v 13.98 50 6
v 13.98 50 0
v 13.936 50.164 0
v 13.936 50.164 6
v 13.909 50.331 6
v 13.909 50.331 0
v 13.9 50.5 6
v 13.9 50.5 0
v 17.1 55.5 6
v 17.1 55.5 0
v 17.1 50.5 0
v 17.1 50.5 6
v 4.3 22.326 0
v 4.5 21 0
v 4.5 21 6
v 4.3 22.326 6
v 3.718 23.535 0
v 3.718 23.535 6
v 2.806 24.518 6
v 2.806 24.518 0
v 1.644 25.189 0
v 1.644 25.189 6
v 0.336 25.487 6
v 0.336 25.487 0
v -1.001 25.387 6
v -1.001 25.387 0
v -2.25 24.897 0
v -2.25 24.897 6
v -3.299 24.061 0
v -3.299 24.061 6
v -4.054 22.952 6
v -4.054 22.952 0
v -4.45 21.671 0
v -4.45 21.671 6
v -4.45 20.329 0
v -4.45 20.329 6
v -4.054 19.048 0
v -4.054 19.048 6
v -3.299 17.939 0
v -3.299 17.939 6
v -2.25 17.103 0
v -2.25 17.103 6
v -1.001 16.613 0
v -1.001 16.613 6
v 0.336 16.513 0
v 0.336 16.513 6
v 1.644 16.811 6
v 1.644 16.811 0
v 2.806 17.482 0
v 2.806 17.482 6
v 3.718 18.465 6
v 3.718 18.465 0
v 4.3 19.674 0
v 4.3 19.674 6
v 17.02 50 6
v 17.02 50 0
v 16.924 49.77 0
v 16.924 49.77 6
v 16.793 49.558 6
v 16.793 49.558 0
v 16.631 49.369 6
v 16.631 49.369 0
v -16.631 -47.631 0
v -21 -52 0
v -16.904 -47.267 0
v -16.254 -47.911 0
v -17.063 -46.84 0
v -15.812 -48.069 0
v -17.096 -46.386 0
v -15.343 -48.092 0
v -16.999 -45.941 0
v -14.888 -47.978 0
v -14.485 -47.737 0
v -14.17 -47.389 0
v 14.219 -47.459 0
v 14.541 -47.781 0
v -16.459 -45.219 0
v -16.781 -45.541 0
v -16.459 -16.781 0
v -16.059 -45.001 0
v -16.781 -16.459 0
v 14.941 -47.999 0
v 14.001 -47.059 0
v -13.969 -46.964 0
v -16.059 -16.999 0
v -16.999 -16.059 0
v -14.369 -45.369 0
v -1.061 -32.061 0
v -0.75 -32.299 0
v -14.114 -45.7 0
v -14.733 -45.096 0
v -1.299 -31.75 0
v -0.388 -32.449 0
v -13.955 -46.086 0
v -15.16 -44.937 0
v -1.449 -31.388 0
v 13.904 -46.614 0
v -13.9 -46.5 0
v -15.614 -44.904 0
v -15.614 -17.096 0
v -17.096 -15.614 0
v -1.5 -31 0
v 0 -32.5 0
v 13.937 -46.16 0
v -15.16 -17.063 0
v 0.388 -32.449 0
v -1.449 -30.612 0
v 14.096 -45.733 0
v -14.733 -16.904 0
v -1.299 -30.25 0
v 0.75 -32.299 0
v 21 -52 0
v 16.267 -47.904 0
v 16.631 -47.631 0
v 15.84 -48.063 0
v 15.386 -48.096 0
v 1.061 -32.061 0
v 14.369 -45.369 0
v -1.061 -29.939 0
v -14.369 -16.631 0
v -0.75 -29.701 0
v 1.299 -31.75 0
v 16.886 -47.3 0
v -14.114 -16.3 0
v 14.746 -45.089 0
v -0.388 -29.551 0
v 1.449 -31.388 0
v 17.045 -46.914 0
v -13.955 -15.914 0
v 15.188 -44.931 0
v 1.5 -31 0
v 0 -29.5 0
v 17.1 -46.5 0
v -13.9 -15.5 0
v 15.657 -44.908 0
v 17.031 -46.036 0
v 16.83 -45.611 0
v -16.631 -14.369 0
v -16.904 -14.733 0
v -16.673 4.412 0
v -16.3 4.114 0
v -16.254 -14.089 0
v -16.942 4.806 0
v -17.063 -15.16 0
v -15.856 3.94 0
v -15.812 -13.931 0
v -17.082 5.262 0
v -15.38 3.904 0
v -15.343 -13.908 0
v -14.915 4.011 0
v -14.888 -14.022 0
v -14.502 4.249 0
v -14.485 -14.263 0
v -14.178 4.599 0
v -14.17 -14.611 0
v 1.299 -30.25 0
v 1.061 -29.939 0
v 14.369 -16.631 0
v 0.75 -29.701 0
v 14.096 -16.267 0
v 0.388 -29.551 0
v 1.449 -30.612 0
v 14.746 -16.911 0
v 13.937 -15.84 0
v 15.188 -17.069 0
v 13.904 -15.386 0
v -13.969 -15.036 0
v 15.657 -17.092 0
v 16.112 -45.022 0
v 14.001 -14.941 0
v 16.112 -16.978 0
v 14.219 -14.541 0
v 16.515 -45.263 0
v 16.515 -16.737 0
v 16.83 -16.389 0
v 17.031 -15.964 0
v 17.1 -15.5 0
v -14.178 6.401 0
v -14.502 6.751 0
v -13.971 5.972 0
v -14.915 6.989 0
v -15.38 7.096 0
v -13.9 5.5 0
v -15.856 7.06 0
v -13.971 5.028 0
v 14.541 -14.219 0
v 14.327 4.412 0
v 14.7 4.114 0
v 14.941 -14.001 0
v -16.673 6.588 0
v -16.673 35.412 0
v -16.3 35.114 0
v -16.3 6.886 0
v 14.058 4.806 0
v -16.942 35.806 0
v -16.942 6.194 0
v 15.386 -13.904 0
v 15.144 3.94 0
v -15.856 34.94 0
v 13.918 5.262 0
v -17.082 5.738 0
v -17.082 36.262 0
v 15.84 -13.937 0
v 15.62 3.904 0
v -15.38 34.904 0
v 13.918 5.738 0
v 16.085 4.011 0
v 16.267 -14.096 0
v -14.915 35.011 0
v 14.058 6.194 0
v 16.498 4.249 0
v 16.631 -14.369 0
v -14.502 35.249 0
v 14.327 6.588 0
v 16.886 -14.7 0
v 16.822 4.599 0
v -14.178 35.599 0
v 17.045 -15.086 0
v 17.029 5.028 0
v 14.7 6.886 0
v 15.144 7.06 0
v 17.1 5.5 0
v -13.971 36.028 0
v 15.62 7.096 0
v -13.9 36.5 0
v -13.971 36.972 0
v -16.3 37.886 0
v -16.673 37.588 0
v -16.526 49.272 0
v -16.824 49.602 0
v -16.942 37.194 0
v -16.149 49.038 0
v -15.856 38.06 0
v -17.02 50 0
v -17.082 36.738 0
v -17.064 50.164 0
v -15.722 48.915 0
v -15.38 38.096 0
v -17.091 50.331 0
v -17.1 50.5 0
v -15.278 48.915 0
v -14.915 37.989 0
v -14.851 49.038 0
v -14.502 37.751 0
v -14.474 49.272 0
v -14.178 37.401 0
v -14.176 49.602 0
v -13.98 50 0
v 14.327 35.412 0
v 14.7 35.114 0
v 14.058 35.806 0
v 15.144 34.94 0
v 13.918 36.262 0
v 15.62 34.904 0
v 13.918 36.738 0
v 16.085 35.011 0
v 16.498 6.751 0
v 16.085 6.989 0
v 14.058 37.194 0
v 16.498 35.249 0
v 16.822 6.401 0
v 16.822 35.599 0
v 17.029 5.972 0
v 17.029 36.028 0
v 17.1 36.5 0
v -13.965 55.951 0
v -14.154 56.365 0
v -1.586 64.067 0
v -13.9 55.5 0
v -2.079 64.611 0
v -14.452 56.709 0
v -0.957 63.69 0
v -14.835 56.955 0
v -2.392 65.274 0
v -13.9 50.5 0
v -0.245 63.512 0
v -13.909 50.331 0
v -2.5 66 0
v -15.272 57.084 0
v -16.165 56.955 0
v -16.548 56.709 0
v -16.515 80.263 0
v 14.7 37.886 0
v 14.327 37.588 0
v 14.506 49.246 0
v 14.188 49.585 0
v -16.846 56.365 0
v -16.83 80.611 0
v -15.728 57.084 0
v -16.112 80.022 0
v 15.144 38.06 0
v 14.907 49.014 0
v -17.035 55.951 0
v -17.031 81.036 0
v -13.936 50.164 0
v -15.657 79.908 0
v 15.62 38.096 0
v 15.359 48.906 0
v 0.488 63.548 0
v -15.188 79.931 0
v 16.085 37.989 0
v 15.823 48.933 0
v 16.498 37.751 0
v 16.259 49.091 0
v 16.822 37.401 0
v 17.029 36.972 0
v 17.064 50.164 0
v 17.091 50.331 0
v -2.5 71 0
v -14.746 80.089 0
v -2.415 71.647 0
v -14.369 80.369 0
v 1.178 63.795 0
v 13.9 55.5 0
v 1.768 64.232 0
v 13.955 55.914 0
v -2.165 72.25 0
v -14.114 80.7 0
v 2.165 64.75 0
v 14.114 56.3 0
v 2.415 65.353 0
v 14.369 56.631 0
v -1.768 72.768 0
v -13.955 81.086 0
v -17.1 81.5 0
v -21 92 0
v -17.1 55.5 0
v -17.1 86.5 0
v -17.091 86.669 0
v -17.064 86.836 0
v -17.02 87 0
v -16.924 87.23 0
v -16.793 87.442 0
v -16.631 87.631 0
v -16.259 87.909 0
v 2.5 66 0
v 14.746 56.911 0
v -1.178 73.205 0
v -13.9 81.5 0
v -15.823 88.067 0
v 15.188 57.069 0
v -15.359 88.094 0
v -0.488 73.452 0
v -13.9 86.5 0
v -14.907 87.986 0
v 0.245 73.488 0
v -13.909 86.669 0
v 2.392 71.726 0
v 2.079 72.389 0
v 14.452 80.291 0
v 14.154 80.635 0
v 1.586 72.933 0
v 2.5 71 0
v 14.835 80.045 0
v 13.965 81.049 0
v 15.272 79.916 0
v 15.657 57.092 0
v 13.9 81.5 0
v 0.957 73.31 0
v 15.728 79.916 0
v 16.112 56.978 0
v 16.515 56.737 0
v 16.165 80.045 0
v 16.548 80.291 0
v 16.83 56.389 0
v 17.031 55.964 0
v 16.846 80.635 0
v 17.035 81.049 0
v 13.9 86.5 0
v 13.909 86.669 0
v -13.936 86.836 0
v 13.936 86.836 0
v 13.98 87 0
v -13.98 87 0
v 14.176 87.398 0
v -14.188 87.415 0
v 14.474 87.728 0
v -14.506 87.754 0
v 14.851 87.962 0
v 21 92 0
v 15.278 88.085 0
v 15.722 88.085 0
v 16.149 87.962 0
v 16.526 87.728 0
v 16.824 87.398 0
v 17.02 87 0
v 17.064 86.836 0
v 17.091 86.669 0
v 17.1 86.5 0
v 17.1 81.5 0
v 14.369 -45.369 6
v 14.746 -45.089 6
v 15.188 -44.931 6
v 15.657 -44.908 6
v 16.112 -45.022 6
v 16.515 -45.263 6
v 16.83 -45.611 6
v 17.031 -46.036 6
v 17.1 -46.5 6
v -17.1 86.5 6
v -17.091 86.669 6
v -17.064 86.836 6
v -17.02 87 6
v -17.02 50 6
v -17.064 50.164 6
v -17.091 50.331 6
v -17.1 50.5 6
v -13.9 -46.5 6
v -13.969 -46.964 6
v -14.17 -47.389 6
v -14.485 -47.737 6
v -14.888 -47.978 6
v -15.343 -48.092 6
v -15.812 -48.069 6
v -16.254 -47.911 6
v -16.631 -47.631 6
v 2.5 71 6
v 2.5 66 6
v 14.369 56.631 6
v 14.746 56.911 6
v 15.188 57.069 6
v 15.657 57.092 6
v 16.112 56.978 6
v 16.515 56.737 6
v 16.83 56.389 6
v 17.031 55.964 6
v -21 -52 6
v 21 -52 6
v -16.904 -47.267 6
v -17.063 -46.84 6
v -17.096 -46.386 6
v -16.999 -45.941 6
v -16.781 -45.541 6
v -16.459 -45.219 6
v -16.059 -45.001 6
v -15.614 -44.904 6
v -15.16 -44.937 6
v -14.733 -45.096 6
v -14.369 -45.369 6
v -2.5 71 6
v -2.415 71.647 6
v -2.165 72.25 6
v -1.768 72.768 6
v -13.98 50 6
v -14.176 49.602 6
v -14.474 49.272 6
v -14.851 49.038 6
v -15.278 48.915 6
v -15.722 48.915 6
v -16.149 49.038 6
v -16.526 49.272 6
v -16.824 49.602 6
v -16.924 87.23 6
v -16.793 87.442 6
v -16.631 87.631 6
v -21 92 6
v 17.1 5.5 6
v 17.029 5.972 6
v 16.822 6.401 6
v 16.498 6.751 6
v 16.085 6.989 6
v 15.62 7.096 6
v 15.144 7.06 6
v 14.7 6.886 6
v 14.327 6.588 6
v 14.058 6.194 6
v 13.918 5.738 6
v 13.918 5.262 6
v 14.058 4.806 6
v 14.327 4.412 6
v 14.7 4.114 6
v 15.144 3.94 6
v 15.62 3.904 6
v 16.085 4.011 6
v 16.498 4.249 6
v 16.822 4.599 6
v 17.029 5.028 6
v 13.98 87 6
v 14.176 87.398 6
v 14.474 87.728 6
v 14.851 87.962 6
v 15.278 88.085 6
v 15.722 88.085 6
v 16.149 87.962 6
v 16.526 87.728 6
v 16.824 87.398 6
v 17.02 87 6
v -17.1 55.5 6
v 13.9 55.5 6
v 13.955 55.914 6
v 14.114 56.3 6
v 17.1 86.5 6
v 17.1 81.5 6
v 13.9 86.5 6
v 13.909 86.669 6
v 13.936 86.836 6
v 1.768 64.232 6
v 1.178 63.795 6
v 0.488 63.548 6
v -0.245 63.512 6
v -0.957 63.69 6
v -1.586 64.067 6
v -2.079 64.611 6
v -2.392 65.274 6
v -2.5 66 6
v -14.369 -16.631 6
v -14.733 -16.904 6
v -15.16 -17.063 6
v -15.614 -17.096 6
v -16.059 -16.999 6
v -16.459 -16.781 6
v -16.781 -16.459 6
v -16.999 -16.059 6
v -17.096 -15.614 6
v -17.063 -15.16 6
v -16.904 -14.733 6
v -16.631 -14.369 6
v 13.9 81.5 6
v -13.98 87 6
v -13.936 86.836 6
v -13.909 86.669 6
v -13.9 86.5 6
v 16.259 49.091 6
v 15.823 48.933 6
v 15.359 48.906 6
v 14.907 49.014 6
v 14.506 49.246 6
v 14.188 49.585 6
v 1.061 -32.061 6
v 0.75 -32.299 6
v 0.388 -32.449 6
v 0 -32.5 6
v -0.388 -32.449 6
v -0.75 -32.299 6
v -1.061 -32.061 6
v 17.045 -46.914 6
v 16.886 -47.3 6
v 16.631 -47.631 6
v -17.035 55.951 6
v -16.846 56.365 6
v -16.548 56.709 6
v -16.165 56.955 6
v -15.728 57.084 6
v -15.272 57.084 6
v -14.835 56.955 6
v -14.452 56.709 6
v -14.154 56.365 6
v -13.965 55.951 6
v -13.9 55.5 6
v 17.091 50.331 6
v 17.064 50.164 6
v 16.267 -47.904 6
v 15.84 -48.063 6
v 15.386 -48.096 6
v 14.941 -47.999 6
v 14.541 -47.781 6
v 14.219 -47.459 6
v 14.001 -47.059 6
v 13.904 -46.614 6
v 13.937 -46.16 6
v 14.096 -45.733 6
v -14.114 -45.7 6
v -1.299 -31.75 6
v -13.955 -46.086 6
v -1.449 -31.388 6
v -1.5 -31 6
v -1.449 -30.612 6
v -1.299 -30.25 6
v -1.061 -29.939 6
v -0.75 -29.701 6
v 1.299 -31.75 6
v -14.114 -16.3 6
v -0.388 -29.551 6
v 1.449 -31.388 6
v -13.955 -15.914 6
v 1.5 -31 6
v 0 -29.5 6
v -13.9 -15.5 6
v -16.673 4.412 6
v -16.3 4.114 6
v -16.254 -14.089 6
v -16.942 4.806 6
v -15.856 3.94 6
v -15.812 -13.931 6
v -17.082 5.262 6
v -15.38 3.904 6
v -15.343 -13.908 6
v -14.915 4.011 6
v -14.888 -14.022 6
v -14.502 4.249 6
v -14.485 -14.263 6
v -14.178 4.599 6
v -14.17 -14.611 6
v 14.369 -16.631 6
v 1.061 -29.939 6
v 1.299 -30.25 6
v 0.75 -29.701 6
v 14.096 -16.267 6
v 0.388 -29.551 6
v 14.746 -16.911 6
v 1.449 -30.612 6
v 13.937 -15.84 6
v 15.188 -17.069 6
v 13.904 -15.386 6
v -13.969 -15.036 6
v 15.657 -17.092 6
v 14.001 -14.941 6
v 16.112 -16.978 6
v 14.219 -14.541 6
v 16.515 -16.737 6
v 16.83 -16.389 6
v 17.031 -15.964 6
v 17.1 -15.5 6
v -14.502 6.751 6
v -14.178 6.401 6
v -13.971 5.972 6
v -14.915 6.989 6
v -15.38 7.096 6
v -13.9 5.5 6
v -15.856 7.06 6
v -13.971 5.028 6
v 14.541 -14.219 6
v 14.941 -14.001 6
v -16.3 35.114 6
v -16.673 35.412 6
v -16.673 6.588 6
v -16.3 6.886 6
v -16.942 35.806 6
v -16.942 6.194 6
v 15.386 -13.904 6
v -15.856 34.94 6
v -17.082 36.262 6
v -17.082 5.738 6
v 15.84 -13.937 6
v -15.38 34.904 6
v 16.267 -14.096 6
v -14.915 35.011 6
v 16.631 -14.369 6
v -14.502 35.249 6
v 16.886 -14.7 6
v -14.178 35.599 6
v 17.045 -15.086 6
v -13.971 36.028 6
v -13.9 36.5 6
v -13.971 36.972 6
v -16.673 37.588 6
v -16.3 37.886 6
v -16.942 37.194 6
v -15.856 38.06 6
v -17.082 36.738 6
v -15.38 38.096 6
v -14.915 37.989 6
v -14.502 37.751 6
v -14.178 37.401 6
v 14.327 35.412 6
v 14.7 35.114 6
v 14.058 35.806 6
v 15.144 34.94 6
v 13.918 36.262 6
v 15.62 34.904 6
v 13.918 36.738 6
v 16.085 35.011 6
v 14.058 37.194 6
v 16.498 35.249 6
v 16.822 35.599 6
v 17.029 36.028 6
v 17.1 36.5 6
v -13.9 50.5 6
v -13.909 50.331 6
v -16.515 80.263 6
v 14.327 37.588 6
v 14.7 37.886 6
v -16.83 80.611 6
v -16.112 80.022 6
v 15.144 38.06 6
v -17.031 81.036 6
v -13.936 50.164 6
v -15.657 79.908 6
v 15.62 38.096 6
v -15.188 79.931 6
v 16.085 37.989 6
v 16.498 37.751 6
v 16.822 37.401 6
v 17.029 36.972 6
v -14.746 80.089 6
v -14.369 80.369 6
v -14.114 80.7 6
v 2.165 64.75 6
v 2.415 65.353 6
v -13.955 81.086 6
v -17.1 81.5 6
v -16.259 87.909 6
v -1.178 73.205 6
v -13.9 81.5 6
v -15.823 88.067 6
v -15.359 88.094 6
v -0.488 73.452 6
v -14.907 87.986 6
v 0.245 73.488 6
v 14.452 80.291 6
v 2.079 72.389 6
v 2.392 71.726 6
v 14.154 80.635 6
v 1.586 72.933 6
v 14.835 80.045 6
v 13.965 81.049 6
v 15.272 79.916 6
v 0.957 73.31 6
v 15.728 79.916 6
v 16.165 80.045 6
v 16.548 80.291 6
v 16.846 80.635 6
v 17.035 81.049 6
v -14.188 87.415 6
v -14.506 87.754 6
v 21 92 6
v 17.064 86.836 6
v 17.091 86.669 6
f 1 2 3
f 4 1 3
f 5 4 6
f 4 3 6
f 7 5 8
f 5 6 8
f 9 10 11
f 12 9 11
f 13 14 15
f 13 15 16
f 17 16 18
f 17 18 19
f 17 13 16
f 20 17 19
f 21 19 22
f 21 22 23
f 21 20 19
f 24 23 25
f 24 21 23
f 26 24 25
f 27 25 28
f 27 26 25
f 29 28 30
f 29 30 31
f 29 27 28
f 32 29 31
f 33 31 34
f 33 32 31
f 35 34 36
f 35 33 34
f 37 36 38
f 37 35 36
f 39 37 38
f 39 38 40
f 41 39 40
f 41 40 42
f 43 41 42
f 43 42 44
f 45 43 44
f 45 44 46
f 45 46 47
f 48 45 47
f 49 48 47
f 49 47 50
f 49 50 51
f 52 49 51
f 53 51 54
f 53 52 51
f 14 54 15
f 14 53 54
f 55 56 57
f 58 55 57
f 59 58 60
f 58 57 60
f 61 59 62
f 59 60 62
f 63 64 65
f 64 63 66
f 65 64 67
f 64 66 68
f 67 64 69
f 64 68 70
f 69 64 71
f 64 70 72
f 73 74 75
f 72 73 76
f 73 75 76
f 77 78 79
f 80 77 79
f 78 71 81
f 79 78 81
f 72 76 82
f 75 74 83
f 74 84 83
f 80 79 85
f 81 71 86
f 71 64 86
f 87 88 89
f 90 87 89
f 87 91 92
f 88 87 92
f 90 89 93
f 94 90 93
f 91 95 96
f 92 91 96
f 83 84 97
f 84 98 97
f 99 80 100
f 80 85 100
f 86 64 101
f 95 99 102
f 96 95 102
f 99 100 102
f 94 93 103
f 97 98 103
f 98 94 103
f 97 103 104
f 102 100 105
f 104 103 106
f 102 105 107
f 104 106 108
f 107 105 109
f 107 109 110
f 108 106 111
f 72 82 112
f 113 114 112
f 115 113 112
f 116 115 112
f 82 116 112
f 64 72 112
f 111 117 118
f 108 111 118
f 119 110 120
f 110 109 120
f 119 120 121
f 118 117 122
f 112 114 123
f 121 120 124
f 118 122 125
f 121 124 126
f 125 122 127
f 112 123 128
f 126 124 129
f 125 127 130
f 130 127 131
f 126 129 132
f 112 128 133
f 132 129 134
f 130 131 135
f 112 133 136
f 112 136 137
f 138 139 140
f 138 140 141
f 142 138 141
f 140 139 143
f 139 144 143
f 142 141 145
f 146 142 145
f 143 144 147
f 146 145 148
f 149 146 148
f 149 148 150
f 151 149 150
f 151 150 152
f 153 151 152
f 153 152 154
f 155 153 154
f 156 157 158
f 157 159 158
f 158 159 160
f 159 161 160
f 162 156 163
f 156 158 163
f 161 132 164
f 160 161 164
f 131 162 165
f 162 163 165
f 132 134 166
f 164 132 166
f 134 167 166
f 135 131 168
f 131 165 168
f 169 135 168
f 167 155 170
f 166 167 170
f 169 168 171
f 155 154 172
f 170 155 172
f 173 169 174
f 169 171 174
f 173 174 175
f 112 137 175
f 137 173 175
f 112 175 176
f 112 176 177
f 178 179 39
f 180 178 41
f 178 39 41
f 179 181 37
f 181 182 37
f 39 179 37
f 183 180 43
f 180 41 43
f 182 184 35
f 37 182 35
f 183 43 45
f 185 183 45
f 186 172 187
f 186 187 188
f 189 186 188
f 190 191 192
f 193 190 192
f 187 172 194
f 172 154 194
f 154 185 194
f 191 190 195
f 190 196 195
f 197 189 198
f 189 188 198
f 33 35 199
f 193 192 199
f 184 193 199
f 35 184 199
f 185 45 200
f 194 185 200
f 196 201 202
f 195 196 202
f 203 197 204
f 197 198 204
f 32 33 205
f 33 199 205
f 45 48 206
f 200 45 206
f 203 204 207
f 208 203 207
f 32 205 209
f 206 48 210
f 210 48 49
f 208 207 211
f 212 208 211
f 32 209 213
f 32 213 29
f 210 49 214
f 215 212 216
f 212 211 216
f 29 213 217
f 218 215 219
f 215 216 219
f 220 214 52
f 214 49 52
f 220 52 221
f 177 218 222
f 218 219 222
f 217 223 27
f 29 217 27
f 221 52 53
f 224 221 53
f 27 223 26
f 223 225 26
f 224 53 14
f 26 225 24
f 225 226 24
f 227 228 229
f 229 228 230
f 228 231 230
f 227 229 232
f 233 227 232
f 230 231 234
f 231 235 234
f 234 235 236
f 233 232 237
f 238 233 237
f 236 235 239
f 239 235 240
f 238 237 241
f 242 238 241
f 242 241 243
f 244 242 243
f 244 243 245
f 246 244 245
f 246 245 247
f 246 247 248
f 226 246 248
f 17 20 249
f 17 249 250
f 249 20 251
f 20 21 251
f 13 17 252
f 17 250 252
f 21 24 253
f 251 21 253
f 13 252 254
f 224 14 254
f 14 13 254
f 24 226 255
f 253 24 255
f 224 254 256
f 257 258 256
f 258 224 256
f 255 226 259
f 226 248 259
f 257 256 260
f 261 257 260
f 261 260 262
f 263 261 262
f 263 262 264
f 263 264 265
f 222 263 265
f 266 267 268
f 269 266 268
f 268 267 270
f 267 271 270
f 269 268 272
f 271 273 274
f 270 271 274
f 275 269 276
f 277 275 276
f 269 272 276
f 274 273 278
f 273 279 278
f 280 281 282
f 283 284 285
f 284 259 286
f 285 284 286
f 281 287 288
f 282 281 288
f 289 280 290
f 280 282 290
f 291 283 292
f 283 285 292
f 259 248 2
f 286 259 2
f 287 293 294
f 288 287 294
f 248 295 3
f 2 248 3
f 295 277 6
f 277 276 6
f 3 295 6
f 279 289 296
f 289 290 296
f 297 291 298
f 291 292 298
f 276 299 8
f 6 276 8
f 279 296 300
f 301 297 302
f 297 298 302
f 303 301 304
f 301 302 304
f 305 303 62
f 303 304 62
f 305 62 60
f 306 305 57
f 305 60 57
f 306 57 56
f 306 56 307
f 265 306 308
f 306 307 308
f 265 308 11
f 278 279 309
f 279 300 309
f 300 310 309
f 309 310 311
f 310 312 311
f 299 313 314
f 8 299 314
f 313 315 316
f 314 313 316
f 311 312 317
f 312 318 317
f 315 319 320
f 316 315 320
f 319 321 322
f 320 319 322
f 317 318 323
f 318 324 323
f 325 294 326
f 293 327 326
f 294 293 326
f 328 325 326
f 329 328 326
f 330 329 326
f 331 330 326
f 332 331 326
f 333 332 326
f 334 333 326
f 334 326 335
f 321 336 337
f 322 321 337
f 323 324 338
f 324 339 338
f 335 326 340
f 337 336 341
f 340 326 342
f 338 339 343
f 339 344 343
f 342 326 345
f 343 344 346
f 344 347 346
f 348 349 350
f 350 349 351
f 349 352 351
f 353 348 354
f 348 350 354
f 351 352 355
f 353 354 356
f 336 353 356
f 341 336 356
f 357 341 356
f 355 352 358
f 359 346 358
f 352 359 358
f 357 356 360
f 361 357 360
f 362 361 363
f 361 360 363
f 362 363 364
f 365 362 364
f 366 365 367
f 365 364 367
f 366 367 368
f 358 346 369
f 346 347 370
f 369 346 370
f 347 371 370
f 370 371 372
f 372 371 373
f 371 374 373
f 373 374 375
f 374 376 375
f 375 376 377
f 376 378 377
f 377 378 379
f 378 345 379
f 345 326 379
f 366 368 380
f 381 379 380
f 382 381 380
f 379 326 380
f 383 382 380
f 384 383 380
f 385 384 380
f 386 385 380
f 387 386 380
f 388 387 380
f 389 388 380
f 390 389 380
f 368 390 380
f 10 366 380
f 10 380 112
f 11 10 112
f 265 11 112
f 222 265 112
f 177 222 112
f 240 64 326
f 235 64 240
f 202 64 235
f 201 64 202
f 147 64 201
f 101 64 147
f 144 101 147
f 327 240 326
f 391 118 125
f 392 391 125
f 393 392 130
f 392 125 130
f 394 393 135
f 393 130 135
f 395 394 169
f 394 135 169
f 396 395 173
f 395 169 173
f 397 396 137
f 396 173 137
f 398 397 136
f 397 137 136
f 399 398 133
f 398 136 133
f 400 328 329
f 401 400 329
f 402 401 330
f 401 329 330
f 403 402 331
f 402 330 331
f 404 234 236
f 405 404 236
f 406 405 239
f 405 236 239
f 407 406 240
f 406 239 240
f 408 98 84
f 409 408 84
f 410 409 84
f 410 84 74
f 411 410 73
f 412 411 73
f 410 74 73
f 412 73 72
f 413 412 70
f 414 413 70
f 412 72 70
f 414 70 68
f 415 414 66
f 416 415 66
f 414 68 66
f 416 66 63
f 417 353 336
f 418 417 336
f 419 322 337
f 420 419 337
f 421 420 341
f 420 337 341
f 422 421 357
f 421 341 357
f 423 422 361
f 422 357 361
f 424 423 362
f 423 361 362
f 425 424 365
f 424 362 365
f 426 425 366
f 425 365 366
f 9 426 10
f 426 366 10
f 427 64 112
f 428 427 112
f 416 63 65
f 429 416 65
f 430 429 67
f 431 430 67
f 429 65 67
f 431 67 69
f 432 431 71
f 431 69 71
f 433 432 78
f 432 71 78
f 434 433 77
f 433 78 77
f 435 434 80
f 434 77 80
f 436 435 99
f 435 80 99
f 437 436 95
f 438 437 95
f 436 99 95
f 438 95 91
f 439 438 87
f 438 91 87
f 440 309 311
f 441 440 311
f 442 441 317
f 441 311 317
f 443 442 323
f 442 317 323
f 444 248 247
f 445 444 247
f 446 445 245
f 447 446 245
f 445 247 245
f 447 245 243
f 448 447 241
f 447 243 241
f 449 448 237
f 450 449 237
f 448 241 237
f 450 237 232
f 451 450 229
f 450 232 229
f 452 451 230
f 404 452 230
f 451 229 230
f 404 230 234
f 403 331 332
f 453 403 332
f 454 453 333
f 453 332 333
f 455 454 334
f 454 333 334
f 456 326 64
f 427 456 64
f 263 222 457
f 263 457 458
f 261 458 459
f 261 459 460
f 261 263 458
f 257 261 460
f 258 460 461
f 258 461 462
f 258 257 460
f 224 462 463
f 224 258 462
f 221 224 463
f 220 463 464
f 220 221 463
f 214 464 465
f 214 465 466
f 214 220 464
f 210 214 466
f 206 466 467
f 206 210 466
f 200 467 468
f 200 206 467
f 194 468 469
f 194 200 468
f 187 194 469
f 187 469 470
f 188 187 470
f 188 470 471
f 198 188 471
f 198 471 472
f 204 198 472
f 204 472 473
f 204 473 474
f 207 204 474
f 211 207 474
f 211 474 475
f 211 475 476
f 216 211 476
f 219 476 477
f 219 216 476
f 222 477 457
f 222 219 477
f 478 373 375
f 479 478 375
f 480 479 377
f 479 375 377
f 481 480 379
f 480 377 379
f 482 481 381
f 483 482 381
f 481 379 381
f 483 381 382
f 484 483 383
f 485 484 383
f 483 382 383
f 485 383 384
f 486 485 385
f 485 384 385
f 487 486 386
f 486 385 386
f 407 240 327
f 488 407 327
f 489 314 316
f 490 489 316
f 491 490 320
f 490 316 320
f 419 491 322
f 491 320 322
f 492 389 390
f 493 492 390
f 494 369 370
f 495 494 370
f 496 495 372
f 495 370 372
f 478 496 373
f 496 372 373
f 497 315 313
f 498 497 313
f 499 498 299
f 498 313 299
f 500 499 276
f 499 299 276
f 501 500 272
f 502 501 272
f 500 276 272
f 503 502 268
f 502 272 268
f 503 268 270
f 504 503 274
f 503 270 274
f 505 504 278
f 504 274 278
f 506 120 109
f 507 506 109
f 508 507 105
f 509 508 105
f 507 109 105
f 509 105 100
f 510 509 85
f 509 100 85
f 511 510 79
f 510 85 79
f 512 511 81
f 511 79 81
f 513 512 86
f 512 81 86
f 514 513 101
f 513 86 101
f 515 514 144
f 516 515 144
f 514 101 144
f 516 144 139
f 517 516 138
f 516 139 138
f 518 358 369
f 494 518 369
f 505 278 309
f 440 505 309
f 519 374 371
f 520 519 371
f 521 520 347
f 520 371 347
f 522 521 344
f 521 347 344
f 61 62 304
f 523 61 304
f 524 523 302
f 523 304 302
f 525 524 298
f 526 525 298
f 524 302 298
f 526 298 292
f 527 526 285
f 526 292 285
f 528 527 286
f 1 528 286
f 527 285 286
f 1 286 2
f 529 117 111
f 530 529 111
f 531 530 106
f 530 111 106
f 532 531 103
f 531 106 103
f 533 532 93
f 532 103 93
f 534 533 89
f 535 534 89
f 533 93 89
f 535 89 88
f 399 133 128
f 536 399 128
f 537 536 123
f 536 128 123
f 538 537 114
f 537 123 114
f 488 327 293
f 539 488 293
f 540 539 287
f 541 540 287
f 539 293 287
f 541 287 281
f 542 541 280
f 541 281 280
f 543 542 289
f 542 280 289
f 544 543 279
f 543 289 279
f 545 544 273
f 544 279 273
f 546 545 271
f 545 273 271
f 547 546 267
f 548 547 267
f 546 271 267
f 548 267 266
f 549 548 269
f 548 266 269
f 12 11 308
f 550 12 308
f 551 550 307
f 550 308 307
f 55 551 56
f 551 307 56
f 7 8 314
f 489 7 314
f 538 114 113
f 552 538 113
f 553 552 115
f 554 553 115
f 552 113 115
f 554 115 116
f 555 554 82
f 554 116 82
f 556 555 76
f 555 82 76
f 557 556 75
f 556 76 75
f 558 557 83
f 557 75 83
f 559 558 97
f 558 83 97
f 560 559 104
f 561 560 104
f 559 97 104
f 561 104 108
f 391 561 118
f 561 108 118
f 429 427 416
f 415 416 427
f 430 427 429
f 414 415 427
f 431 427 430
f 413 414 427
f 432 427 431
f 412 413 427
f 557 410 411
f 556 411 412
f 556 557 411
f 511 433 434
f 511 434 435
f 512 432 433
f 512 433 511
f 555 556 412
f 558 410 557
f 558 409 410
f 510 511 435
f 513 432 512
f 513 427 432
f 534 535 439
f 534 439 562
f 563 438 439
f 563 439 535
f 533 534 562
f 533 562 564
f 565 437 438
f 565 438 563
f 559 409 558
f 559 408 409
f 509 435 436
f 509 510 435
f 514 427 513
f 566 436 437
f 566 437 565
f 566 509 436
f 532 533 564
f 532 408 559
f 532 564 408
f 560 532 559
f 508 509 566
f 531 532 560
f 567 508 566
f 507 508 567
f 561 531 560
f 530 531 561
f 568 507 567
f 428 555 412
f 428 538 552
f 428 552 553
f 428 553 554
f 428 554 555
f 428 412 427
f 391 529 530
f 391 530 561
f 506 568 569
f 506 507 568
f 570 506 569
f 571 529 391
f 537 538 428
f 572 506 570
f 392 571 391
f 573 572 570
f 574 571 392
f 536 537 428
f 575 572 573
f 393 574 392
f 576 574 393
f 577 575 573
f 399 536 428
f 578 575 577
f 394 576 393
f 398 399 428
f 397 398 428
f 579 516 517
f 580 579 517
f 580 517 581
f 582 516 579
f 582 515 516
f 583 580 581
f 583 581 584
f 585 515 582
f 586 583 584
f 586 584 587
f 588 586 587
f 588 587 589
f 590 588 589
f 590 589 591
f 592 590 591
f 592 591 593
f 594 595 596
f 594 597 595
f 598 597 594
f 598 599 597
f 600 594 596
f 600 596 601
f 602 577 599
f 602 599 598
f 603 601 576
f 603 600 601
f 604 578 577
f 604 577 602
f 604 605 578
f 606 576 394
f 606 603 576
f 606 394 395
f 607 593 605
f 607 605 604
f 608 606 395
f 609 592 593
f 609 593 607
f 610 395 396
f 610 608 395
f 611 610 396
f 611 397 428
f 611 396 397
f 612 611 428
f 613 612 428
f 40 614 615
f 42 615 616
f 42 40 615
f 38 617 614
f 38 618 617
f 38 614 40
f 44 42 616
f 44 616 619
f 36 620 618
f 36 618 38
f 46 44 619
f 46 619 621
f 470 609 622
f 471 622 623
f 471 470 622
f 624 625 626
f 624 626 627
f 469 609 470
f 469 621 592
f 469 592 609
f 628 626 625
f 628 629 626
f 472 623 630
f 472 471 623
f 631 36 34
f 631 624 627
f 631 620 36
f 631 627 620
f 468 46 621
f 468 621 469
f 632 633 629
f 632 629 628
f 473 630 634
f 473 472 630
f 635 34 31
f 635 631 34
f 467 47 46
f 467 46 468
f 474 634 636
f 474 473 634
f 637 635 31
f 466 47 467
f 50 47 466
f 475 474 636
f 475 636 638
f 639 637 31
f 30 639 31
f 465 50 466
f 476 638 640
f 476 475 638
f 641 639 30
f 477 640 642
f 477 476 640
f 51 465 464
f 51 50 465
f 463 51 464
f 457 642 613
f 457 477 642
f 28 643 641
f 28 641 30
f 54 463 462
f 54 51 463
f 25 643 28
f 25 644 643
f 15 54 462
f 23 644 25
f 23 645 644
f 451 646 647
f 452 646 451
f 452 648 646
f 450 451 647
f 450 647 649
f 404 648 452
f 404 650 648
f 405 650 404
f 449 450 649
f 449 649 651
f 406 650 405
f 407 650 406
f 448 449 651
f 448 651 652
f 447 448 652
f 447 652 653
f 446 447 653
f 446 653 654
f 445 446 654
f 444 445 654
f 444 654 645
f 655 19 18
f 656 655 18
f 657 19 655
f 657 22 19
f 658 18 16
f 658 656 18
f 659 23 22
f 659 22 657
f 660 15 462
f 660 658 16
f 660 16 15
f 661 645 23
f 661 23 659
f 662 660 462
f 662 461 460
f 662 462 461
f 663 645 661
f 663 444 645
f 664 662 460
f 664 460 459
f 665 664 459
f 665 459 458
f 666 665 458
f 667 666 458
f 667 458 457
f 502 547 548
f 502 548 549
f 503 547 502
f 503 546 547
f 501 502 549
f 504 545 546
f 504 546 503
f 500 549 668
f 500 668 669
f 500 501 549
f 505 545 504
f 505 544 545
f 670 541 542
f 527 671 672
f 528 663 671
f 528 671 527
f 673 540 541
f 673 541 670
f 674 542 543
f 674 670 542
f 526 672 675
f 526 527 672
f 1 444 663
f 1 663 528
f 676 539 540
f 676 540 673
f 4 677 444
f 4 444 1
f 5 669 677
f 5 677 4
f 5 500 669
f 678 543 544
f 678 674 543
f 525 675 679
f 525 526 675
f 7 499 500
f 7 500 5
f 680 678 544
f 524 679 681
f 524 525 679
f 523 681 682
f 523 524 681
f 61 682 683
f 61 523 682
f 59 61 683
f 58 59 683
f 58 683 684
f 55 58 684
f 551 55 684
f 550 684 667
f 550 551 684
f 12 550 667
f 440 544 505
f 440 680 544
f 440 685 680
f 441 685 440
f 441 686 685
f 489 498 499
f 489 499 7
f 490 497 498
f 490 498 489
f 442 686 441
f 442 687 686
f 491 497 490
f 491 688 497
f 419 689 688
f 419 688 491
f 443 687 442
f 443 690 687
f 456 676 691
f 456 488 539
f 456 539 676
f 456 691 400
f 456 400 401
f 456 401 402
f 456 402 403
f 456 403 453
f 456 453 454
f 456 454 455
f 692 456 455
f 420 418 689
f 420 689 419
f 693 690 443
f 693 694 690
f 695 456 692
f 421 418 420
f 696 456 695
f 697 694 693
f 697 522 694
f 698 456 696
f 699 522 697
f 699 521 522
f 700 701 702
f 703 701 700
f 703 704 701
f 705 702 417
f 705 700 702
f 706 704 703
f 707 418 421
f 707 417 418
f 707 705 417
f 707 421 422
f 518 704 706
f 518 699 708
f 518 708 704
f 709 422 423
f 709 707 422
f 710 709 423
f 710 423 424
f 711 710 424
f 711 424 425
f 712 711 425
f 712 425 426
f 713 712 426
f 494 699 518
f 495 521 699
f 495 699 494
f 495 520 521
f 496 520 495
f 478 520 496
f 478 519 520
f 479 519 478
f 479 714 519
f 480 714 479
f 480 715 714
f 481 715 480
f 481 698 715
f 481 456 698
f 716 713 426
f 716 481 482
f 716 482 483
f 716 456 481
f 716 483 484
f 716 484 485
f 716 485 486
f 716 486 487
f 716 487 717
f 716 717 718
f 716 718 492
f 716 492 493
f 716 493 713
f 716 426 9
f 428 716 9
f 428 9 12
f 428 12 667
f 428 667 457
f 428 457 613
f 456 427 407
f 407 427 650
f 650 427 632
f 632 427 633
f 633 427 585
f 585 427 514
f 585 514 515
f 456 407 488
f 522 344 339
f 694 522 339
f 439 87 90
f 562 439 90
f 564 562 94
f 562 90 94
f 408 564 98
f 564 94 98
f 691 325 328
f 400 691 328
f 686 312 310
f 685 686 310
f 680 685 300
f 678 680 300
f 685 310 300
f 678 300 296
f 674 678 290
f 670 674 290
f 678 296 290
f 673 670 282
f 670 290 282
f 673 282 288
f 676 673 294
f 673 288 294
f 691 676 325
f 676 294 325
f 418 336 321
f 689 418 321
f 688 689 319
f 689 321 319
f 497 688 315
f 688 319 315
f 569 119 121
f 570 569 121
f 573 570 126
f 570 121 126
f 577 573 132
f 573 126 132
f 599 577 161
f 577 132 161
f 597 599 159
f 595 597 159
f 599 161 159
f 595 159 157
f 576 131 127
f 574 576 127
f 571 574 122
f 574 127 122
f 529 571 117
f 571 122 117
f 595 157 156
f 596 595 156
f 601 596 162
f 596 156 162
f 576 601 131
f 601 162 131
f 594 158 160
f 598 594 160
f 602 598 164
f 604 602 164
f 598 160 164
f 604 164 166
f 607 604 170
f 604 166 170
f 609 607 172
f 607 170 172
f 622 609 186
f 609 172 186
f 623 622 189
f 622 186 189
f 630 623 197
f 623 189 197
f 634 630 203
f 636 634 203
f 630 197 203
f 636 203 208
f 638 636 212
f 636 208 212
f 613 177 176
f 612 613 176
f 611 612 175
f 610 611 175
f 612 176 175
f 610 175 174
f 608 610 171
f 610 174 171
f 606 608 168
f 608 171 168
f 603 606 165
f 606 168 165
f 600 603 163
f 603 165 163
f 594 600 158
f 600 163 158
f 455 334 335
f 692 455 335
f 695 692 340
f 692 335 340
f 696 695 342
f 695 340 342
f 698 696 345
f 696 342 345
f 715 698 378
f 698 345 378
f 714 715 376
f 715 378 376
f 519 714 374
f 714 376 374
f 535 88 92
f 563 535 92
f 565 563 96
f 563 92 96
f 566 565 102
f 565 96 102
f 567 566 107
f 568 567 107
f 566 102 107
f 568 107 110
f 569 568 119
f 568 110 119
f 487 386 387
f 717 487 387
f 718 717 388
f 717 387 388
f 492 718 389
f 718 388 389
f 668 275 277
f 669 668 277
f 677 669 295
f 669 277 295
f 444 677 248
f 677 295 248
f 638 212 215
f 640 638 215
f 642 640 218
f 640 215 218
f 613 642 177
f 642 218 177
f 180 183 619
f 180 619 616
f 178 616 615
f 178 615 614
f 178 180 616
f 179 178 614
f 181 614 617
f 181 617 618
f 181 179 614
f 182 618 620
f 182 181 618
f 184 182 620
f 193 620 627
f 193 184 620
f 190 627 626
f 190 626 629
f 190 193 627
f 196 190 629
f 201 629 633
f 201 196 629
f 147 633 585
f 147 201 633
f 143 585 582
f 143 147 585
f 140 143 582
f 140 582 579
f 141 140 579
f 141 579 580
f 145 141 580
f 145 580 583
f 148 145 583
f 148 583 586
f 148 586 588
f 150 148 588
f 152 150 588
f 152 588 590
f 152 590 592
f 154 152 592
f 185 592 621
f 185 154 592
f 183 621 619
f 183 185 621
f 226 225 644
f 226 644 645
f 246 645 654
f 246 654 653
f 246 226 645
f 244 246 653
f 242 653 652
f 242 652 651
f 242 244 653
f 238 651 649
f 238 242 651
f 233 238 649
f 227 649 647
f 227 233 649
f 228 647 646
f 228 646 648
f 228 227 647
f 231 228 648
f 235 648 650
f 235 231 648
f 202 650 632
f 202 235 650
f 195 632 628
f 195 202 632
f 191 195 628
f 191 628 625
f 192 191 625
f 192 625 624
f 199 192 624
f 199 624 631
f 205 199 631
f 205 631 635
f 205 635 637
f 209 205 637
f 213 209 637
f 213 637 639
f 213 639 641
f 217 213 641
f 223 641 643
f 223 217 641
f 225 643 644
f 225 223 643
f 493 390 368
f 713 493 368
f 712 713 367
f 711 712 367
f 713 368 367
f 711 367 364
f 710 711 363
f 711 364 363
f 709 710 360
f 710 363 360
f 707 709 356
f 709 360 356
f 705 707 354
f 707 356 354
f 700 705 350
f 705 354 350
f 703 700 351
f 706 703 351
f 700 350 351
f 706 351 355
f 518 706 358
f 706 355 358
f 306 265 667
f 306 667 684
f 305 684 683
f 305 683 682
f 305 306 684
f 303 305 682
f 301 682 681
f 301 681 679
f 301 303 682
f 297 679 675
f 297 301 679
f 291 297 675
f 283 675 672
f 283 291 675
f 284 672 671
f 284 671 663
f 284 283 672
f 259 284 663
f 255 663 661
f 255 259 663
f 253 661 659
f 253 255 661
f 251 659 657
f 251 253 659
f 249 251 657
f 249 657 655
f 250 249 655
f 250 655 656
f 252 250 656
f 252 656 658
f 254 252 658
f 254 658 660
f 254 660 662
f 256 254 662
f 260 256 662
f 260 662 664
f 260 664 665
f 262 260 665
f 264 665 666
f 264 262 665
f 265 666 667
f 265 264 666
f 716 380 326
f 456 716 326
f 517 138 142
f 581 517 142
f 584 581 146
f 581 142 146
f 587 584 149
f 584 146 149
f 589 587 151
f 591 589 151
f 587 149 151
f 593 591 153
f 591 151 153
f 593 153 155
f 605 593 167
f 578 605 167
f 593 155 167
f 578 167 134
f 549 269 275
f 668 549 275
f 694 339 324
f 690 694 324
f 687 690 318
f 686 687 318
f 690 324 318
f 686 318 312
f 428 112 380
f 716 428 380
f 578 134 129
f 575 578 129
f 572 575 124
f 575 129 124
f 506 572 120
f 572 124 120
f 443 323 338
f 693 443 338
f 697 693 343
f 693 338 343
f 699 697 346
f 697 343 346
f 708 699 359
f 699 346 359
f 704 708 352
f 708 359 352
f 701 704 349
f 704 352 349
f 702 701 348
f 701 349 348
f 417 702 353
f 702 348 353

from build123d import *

# Parameters (mm, degrees)
SKETCH_1_W      = 42
SKETCH_1_H      = 3
SKETCH_1_H_2    = 42
SKETCH_1_R      = 1.6
SKETCH_1_R_2    = 4.5
SKETCH_1_H_3    = 10
EXTRUDE_1_DEPTH = 6


with BuildPart() as part:
    # 草图1 → 凸台-拉伸1 (new body)
    # profile 1 of 18: a face of its own
    with BuildSketch(Plane.XY):
        with Locations((0, 43.5)):
            Rectangle(SKETCH_1_W, SKETCH_1_H)
    # profile 2 of 18: a face of its own
    with BuildSketch(Plane.XY):
        with BuildLine():
            Line((21, 92), (-21, 92))
            Line((-21, 92), (-16.63137085, 87.63137085))
            ThreePointArc((-16.63137085, 87.63137085), (-15.129338595, 88.056473618), (-13.980131585, 87))
            Line((-13.980131585, 87), (13.980131585, 87))
            ThreePointArc((13.980131585, 87), (15.5, 88.1), (17.019868415, 87))
            Line((17.019868415, 87), (21, 87))
            Line((21, 87), (21, 92))
        make_face()
    # profile 3 of 18: a face of its own
    with BuildSketch(Plane.XY):
        with BuildLine():
            Line((-21, 92), (-21, 87))
            Line((-21, 87), (-17.019868415, 87))
            ThreePointArc((-17.019868415, 87), (-16.862690243, 87.338495857), (-16.63137085, 87.63137085))
            Line((-16.63137085, 87.63137085), (-21, 92))
        make_face()
    # profile 4 of 18: a face of its own
    with BuildSketch(Plane.XY):
        with BuildLine():
            Line((-17.019868415, 87), (-21, 87))
            Line((-21, 87), (-17.1, 83.1))
            Line((-17.1, 83.1), (-17.1, 86.5))
            ThreePointArc((-17.1, 86.5), (-17.079840097, 86.753190181), (-17.019868415, 87))
        make_face()
    # profile 5 of 18: a face of its own
    with BuildSketch(Plane.XY):
        with BuildLine():
            Line((13.980131585, 87), (-13.980131585, 87))
            ThreePointArc((-13.980131585, 87), (-13.920159903, 86.753190181), (-13.9, 86.5))
            Line((-13.9, 86.5), (-13.9, 84.9))
            Line((-13.9, 84.9), (-1.767766953, 72.767766953))
            ThreePointArc((-1.767766953, 72.767766953), (0.956708581, 73.309698831), (2.5, 71))
            Line((2.5, 71), (2.5, 68.5))
            Line((2.5, 68.5), (14.36862915, 56.63137085))
            ThreePointArc((14.36862915, 56.63137085), (16.112293492, 56.978207252), (17.1, 55.5))
            Line((17.1, 55.5), (17.1, 53.9))
            Line((17.1, 53.9), (21, 50))
            Line((21, 50), (21, 87))
            Line((21, 87), (17.019868415, 87))
            ThreePointArc((17.019868415, 87), (17.079840097, 86.753190181), (17.1, 86.5))
            Line((17.1, 86.5), (17.1, 81.5))
            ThreePointArc((17.1, 81.5), (15.5, 79.9), (13.9, 81.5))
            Line((13.9, 81.5), (13.9, 86.5))
            ThreePointArc((13.9, 86.5), (13.920159903, 86.753190181), (13.980131585, 87))
        make_face()
    # profile 6 of 18: a face of its own
    with BuildSketch(Plane.XY):
        with BuildLine():
            ThreePointArc((-13.9, 81.5), (-14.021792748, 80.887706508), (-14.36862915, 80.36862915))
            Line((-14.36862915, 80.36862915), (-2.5, 68.5))
            Line((-2.5, 68.5), (-2.5, 71))
            ThreePointArc((-2.5, 71), (-2.309698831, 71.956708581), (-1.767766953, 72.767766953))
            Line((-1.767766953, 72.767766953), (-13.9, 84.9))
            Line((-13.9, 84.9), (-13.9, 81.5))
        make_face()
    # profile 7 of 18: a face of its own
    with BuildSketch(Plane.XY):
        with BuildLine():
            Line((-17.1, 83.1), (-21, 87))
            Line((-21, 87), (-21, 50))
            Line((-21, 50), (-17.019868415, 50))
            ThreePointArc((-17.019868415, 50), (-17.079840097, 50.246809819), (-17.1, 50.5))
            Line((-17.1, 50.5), (-17.1, 55.5))
            ThreePointArc((-17.1, 55.5), (-15.5, 57.1), (-13.9, 55.5))
            Line((-13.9, 55.5), (-13.9, 50.5))
            ThreePointArc((-13.9, 50.5), (-13.920159903, 50.246809819), (-13.980131585, 50))
            Line((-13.980131585, 50), (13.980131585, 50))
            ThreePointArc((13.980131585, 50), (13.920159903, 50.246809819), (13.9, 50.5))
            Line((13.9, 50.5), (13.9, 52.1))
            Line((13.9, 52.1), (1.767766953, 64.232233047))
            ThreePointArc((1.767766953, 64.232233047), (-0.956708581, 63.690301169), (-2.5, 66))
            Line((-2.5, 66), (-2.5, 68.5))
            Line((-2.5, 68.5), (-14.36862915, 80.36862915))
            ThreePointArc((-14.36862915, 80.36862915), (-16.112293492, 80.021792748), (-17.1, 81.5))
            Line((-17.1, 81.5), (-17.1, 83.1))
        make_face()
    # profile 8 of 18: a face of its own
    with BuildSketch(Plane.XY):
        with BuildLine():
            ThreePointArc((2.5, 66), (2.309698831, 65.043291419), (1.767766953, 64.232233047))
            Line((1.767766953, 64.232233047), (13.9, 52.1))
            Line((13.9, 52.1), (13.9, 55.5))
            ThreePointArc((13.9, 55.5), (14.021792748, 56.112293492), (14.36862915, 56.63137085))
            Line((14.36862915, 56.63137085), (2.5, 68.5))
            Line((2.5, 68.5), (2.5, 66))
        make_face()
    # profile 9 of 18: a face of its own
    with BuildSketch(Plane.XY):
        with BuildLine():
            Line((17.019868415, 50), (21, 50))
            Line((21, 50), (17.1, 53.9))
            Line((17.1, 53.9), (17.1, 50.5))
            ThreePointArc((17.1, 50.5), (17.079840097, 50.246809819), (17.019868415, 50))
        make_face()
    # profile 10 of 18: a face of its own
    with BuildSketch(Plane.XY):
        with BuildLine():
            Line((16.63137085, 49.36862915), (21, 45))
            Line((21, 45), (21, 50))
            Line((21, 50), (17.019868415, 50))
            ThreePointArc((17.019868415, 50), (16.862690243, 49.661504143), (16.63137085, 49.36862915))
        make_face()
    # profile 11 of 18: a face of its own
    with BuildSketch(Plane.XY):
        with BuildLine():
            Line((-17.019868415, 50), (-21, 50))
            Line((-21, 50), (-21, 45))
            Line((-21, 45), (21, 45))
            Line((21, 45), (16.63137085, 49.36862915))
            ThreePointArc((16.63137085, 49.36862915), (15.129338595, 48.943526382), (13.980131585, 50))
            Line((13.980131585, 50), (-13.980131585, 50))
            ThreePointArc((-13.980131585, 50), (-15.5, 48.9), (-17.019868415, 50))
        make_face()
    # profile 12 of 18: a face of its own
    with BuildSketch(Plane.XY):
        with Locations((0, 43.5)):
            Rectangle(SKETCH_1_W, SKETCH_1_H)
    # profile 13 of 18: a face of its own
    with BuildSketch(Plane.XY):
        with Locations((0, 21)):
            Rectangle(SKETCH_1_W, SKETCH_1_H_2)
        with Locations((-15.5, 5.5)):
            Circle(SKETCH_1_R, mode=Mode.SUBTRACT)
        with Locations((15.5, 5.5)):
            Circle(SKETCH_1_R, mode=Mode.SUBTRACT)
        with Locations((-15.5, 36.5)):
            Circle(SKETCH_1_R, mode=Mode.SUBTRACT)
        with Locations((0, 21)):
            Circle(SKETCH_1_R_2, mode=Mode.SUBTRACT)
        with Locations((15.5, 36.5)):
            Circle(SKETCH_1_R, mode=Mode.SUBTRACT)
    # profile 14 of 18: a face of its own
    with BuildSketch(Plane.XY):
        with Locations((0, -5)):
            Rectangle(SKETCH_1_W, SKETCH_1_H_3)
    # profile 15 of 18: a face of its own
    with BuildSketch(Plane.XY):
        with BuildLine():
            Line((21, -10), (-21, -10))
            Line((-21, -10), (-16.63137085, -14.36862915))
            ThreePointArc((-16.63137085, -14.36862915), (-14.887706508, -14.021792748), (-13.9, -15.5))
            ThreePointArc((-13.9, -15.5), (-14.021792748, -16.112293492), (-14.36862915, -16.63137085))
            Line((-14.36862915, -16.63137085), (-1.060660172, -29.939339828))
            ThreePointArc((-1.060660172, -29.939339828), (0, -29.5), (1.060660172, -29.939339828))
            Line((1.060660172, -29.939339828), (14.36862915, -16.63137085))
            ThreePointArc((14.36862915, -16.63137085), (14.36862915, -14.36862915), (16.63137085, -14.36862915))
            Line((16.63137085, -14.36862915), (21, -10))
        make_face()
    # profile 16 of 18: a face of its own
    with BuildSketch(Plane.XY):
        with BuildLine():
            Line((-16.63137085, -14.36862915), (-21, -10))
            Line((-21, -10), (-21, -52))
            Line((-21, -52), (-16.63137085, -47.63137085))
            ThreePointArc((-16.63137085, -47.63137085), (-16.63137085, -45.36862915), (-14.36862915, -45.36862915))
            Line((-14.36862915, -45.36862915), (-1.060660172, -32.060660172))
            ThreePointArc((-1.060660172, -32.060660172), (-1.5, -31), (-1.060660172, -29.939339828))
            Line((-1.060660172, -29.939339828), (-14.36862915, -16.63137085))
            ThreePointArc((-14.36862915, -16.63137085), (-16.63137085, -16.63137085), (-16.63137085, -14.36862915))
        make_face()
    # profile 17 of 18: a face of its own
    with BuildSketch(Plane.XY):
        with BuildLine():
            Line((-16.63137085, -47.63137085), (-21, -52))
            Line((-21, -52), (21, -52))
            Line((21, -52), (16.63137085, -47.63137085))
            ThreePointArc((16.63137085, -47.63137085), (14.36862915, -47.63137085), (14.36862915, -45.36862915))
            Line((14.36862915, -45.36862915), (1.060660172, -32.060660172))
            ThreePointArc((1.060660172, -32.060660172), (0, -32.5), (-1.060660172, -32.060660172))
            Line((-1.060660172, -32.060660172), (-14.36862915, -45.36862915))
            ThreePointArc((-14.36862915, -45.36862915), (-14.021792748, -45.887706508), (-13.9, -46.5))
            ThreePointArc((-13.9, -46.5), (-14.887706508, -47.978207252), (-16.63137085, -47.63137085))
        make_face()
    # profile 18 of 18: a face of its own
    with BuildSketch(Plane.XY):
        with BuildLine():
            Line((21, -52), (21, -10))
            Line((21, -10), (16.63137085, -14.36862915))
            ThreePointArc((16.63137085, -14.36862915), (16.978207252, -14.887706508), (17.1, -15.5))
            ThreePointArc((17.1, -15.5), (16.112293492, -16.978207252), (14.36862915, -16.63137085))
            Line((14.36862915, -16.63137085), (1.060660172, -29.939339828))
            ThreePointArc((1.060660172, -29.939339828), (1.385819299, -30.425974851), (1.5, -31))
            ThreePointArc((1.5, -31), (1.385819299, -31.574025149), (1.060660172, -32.060660172))
            Line((1.060660172, -32.060660172), (14.36862915, -45.36862915))
            ThreePointArc((14.36862915, -45.36862915), (16.112293492, -45.021792748), (17.1, -46.5))
            ThreePointArc((17.1, -46.5), (16.978207252, -47.112293492), (16.63137085, -47.63137085))
            Line((16.63137085, -47.63137085), (21, -52))
        make_face()
    extrude(amount=EXTRUDE_1_DEPTH)


solid = part.part
